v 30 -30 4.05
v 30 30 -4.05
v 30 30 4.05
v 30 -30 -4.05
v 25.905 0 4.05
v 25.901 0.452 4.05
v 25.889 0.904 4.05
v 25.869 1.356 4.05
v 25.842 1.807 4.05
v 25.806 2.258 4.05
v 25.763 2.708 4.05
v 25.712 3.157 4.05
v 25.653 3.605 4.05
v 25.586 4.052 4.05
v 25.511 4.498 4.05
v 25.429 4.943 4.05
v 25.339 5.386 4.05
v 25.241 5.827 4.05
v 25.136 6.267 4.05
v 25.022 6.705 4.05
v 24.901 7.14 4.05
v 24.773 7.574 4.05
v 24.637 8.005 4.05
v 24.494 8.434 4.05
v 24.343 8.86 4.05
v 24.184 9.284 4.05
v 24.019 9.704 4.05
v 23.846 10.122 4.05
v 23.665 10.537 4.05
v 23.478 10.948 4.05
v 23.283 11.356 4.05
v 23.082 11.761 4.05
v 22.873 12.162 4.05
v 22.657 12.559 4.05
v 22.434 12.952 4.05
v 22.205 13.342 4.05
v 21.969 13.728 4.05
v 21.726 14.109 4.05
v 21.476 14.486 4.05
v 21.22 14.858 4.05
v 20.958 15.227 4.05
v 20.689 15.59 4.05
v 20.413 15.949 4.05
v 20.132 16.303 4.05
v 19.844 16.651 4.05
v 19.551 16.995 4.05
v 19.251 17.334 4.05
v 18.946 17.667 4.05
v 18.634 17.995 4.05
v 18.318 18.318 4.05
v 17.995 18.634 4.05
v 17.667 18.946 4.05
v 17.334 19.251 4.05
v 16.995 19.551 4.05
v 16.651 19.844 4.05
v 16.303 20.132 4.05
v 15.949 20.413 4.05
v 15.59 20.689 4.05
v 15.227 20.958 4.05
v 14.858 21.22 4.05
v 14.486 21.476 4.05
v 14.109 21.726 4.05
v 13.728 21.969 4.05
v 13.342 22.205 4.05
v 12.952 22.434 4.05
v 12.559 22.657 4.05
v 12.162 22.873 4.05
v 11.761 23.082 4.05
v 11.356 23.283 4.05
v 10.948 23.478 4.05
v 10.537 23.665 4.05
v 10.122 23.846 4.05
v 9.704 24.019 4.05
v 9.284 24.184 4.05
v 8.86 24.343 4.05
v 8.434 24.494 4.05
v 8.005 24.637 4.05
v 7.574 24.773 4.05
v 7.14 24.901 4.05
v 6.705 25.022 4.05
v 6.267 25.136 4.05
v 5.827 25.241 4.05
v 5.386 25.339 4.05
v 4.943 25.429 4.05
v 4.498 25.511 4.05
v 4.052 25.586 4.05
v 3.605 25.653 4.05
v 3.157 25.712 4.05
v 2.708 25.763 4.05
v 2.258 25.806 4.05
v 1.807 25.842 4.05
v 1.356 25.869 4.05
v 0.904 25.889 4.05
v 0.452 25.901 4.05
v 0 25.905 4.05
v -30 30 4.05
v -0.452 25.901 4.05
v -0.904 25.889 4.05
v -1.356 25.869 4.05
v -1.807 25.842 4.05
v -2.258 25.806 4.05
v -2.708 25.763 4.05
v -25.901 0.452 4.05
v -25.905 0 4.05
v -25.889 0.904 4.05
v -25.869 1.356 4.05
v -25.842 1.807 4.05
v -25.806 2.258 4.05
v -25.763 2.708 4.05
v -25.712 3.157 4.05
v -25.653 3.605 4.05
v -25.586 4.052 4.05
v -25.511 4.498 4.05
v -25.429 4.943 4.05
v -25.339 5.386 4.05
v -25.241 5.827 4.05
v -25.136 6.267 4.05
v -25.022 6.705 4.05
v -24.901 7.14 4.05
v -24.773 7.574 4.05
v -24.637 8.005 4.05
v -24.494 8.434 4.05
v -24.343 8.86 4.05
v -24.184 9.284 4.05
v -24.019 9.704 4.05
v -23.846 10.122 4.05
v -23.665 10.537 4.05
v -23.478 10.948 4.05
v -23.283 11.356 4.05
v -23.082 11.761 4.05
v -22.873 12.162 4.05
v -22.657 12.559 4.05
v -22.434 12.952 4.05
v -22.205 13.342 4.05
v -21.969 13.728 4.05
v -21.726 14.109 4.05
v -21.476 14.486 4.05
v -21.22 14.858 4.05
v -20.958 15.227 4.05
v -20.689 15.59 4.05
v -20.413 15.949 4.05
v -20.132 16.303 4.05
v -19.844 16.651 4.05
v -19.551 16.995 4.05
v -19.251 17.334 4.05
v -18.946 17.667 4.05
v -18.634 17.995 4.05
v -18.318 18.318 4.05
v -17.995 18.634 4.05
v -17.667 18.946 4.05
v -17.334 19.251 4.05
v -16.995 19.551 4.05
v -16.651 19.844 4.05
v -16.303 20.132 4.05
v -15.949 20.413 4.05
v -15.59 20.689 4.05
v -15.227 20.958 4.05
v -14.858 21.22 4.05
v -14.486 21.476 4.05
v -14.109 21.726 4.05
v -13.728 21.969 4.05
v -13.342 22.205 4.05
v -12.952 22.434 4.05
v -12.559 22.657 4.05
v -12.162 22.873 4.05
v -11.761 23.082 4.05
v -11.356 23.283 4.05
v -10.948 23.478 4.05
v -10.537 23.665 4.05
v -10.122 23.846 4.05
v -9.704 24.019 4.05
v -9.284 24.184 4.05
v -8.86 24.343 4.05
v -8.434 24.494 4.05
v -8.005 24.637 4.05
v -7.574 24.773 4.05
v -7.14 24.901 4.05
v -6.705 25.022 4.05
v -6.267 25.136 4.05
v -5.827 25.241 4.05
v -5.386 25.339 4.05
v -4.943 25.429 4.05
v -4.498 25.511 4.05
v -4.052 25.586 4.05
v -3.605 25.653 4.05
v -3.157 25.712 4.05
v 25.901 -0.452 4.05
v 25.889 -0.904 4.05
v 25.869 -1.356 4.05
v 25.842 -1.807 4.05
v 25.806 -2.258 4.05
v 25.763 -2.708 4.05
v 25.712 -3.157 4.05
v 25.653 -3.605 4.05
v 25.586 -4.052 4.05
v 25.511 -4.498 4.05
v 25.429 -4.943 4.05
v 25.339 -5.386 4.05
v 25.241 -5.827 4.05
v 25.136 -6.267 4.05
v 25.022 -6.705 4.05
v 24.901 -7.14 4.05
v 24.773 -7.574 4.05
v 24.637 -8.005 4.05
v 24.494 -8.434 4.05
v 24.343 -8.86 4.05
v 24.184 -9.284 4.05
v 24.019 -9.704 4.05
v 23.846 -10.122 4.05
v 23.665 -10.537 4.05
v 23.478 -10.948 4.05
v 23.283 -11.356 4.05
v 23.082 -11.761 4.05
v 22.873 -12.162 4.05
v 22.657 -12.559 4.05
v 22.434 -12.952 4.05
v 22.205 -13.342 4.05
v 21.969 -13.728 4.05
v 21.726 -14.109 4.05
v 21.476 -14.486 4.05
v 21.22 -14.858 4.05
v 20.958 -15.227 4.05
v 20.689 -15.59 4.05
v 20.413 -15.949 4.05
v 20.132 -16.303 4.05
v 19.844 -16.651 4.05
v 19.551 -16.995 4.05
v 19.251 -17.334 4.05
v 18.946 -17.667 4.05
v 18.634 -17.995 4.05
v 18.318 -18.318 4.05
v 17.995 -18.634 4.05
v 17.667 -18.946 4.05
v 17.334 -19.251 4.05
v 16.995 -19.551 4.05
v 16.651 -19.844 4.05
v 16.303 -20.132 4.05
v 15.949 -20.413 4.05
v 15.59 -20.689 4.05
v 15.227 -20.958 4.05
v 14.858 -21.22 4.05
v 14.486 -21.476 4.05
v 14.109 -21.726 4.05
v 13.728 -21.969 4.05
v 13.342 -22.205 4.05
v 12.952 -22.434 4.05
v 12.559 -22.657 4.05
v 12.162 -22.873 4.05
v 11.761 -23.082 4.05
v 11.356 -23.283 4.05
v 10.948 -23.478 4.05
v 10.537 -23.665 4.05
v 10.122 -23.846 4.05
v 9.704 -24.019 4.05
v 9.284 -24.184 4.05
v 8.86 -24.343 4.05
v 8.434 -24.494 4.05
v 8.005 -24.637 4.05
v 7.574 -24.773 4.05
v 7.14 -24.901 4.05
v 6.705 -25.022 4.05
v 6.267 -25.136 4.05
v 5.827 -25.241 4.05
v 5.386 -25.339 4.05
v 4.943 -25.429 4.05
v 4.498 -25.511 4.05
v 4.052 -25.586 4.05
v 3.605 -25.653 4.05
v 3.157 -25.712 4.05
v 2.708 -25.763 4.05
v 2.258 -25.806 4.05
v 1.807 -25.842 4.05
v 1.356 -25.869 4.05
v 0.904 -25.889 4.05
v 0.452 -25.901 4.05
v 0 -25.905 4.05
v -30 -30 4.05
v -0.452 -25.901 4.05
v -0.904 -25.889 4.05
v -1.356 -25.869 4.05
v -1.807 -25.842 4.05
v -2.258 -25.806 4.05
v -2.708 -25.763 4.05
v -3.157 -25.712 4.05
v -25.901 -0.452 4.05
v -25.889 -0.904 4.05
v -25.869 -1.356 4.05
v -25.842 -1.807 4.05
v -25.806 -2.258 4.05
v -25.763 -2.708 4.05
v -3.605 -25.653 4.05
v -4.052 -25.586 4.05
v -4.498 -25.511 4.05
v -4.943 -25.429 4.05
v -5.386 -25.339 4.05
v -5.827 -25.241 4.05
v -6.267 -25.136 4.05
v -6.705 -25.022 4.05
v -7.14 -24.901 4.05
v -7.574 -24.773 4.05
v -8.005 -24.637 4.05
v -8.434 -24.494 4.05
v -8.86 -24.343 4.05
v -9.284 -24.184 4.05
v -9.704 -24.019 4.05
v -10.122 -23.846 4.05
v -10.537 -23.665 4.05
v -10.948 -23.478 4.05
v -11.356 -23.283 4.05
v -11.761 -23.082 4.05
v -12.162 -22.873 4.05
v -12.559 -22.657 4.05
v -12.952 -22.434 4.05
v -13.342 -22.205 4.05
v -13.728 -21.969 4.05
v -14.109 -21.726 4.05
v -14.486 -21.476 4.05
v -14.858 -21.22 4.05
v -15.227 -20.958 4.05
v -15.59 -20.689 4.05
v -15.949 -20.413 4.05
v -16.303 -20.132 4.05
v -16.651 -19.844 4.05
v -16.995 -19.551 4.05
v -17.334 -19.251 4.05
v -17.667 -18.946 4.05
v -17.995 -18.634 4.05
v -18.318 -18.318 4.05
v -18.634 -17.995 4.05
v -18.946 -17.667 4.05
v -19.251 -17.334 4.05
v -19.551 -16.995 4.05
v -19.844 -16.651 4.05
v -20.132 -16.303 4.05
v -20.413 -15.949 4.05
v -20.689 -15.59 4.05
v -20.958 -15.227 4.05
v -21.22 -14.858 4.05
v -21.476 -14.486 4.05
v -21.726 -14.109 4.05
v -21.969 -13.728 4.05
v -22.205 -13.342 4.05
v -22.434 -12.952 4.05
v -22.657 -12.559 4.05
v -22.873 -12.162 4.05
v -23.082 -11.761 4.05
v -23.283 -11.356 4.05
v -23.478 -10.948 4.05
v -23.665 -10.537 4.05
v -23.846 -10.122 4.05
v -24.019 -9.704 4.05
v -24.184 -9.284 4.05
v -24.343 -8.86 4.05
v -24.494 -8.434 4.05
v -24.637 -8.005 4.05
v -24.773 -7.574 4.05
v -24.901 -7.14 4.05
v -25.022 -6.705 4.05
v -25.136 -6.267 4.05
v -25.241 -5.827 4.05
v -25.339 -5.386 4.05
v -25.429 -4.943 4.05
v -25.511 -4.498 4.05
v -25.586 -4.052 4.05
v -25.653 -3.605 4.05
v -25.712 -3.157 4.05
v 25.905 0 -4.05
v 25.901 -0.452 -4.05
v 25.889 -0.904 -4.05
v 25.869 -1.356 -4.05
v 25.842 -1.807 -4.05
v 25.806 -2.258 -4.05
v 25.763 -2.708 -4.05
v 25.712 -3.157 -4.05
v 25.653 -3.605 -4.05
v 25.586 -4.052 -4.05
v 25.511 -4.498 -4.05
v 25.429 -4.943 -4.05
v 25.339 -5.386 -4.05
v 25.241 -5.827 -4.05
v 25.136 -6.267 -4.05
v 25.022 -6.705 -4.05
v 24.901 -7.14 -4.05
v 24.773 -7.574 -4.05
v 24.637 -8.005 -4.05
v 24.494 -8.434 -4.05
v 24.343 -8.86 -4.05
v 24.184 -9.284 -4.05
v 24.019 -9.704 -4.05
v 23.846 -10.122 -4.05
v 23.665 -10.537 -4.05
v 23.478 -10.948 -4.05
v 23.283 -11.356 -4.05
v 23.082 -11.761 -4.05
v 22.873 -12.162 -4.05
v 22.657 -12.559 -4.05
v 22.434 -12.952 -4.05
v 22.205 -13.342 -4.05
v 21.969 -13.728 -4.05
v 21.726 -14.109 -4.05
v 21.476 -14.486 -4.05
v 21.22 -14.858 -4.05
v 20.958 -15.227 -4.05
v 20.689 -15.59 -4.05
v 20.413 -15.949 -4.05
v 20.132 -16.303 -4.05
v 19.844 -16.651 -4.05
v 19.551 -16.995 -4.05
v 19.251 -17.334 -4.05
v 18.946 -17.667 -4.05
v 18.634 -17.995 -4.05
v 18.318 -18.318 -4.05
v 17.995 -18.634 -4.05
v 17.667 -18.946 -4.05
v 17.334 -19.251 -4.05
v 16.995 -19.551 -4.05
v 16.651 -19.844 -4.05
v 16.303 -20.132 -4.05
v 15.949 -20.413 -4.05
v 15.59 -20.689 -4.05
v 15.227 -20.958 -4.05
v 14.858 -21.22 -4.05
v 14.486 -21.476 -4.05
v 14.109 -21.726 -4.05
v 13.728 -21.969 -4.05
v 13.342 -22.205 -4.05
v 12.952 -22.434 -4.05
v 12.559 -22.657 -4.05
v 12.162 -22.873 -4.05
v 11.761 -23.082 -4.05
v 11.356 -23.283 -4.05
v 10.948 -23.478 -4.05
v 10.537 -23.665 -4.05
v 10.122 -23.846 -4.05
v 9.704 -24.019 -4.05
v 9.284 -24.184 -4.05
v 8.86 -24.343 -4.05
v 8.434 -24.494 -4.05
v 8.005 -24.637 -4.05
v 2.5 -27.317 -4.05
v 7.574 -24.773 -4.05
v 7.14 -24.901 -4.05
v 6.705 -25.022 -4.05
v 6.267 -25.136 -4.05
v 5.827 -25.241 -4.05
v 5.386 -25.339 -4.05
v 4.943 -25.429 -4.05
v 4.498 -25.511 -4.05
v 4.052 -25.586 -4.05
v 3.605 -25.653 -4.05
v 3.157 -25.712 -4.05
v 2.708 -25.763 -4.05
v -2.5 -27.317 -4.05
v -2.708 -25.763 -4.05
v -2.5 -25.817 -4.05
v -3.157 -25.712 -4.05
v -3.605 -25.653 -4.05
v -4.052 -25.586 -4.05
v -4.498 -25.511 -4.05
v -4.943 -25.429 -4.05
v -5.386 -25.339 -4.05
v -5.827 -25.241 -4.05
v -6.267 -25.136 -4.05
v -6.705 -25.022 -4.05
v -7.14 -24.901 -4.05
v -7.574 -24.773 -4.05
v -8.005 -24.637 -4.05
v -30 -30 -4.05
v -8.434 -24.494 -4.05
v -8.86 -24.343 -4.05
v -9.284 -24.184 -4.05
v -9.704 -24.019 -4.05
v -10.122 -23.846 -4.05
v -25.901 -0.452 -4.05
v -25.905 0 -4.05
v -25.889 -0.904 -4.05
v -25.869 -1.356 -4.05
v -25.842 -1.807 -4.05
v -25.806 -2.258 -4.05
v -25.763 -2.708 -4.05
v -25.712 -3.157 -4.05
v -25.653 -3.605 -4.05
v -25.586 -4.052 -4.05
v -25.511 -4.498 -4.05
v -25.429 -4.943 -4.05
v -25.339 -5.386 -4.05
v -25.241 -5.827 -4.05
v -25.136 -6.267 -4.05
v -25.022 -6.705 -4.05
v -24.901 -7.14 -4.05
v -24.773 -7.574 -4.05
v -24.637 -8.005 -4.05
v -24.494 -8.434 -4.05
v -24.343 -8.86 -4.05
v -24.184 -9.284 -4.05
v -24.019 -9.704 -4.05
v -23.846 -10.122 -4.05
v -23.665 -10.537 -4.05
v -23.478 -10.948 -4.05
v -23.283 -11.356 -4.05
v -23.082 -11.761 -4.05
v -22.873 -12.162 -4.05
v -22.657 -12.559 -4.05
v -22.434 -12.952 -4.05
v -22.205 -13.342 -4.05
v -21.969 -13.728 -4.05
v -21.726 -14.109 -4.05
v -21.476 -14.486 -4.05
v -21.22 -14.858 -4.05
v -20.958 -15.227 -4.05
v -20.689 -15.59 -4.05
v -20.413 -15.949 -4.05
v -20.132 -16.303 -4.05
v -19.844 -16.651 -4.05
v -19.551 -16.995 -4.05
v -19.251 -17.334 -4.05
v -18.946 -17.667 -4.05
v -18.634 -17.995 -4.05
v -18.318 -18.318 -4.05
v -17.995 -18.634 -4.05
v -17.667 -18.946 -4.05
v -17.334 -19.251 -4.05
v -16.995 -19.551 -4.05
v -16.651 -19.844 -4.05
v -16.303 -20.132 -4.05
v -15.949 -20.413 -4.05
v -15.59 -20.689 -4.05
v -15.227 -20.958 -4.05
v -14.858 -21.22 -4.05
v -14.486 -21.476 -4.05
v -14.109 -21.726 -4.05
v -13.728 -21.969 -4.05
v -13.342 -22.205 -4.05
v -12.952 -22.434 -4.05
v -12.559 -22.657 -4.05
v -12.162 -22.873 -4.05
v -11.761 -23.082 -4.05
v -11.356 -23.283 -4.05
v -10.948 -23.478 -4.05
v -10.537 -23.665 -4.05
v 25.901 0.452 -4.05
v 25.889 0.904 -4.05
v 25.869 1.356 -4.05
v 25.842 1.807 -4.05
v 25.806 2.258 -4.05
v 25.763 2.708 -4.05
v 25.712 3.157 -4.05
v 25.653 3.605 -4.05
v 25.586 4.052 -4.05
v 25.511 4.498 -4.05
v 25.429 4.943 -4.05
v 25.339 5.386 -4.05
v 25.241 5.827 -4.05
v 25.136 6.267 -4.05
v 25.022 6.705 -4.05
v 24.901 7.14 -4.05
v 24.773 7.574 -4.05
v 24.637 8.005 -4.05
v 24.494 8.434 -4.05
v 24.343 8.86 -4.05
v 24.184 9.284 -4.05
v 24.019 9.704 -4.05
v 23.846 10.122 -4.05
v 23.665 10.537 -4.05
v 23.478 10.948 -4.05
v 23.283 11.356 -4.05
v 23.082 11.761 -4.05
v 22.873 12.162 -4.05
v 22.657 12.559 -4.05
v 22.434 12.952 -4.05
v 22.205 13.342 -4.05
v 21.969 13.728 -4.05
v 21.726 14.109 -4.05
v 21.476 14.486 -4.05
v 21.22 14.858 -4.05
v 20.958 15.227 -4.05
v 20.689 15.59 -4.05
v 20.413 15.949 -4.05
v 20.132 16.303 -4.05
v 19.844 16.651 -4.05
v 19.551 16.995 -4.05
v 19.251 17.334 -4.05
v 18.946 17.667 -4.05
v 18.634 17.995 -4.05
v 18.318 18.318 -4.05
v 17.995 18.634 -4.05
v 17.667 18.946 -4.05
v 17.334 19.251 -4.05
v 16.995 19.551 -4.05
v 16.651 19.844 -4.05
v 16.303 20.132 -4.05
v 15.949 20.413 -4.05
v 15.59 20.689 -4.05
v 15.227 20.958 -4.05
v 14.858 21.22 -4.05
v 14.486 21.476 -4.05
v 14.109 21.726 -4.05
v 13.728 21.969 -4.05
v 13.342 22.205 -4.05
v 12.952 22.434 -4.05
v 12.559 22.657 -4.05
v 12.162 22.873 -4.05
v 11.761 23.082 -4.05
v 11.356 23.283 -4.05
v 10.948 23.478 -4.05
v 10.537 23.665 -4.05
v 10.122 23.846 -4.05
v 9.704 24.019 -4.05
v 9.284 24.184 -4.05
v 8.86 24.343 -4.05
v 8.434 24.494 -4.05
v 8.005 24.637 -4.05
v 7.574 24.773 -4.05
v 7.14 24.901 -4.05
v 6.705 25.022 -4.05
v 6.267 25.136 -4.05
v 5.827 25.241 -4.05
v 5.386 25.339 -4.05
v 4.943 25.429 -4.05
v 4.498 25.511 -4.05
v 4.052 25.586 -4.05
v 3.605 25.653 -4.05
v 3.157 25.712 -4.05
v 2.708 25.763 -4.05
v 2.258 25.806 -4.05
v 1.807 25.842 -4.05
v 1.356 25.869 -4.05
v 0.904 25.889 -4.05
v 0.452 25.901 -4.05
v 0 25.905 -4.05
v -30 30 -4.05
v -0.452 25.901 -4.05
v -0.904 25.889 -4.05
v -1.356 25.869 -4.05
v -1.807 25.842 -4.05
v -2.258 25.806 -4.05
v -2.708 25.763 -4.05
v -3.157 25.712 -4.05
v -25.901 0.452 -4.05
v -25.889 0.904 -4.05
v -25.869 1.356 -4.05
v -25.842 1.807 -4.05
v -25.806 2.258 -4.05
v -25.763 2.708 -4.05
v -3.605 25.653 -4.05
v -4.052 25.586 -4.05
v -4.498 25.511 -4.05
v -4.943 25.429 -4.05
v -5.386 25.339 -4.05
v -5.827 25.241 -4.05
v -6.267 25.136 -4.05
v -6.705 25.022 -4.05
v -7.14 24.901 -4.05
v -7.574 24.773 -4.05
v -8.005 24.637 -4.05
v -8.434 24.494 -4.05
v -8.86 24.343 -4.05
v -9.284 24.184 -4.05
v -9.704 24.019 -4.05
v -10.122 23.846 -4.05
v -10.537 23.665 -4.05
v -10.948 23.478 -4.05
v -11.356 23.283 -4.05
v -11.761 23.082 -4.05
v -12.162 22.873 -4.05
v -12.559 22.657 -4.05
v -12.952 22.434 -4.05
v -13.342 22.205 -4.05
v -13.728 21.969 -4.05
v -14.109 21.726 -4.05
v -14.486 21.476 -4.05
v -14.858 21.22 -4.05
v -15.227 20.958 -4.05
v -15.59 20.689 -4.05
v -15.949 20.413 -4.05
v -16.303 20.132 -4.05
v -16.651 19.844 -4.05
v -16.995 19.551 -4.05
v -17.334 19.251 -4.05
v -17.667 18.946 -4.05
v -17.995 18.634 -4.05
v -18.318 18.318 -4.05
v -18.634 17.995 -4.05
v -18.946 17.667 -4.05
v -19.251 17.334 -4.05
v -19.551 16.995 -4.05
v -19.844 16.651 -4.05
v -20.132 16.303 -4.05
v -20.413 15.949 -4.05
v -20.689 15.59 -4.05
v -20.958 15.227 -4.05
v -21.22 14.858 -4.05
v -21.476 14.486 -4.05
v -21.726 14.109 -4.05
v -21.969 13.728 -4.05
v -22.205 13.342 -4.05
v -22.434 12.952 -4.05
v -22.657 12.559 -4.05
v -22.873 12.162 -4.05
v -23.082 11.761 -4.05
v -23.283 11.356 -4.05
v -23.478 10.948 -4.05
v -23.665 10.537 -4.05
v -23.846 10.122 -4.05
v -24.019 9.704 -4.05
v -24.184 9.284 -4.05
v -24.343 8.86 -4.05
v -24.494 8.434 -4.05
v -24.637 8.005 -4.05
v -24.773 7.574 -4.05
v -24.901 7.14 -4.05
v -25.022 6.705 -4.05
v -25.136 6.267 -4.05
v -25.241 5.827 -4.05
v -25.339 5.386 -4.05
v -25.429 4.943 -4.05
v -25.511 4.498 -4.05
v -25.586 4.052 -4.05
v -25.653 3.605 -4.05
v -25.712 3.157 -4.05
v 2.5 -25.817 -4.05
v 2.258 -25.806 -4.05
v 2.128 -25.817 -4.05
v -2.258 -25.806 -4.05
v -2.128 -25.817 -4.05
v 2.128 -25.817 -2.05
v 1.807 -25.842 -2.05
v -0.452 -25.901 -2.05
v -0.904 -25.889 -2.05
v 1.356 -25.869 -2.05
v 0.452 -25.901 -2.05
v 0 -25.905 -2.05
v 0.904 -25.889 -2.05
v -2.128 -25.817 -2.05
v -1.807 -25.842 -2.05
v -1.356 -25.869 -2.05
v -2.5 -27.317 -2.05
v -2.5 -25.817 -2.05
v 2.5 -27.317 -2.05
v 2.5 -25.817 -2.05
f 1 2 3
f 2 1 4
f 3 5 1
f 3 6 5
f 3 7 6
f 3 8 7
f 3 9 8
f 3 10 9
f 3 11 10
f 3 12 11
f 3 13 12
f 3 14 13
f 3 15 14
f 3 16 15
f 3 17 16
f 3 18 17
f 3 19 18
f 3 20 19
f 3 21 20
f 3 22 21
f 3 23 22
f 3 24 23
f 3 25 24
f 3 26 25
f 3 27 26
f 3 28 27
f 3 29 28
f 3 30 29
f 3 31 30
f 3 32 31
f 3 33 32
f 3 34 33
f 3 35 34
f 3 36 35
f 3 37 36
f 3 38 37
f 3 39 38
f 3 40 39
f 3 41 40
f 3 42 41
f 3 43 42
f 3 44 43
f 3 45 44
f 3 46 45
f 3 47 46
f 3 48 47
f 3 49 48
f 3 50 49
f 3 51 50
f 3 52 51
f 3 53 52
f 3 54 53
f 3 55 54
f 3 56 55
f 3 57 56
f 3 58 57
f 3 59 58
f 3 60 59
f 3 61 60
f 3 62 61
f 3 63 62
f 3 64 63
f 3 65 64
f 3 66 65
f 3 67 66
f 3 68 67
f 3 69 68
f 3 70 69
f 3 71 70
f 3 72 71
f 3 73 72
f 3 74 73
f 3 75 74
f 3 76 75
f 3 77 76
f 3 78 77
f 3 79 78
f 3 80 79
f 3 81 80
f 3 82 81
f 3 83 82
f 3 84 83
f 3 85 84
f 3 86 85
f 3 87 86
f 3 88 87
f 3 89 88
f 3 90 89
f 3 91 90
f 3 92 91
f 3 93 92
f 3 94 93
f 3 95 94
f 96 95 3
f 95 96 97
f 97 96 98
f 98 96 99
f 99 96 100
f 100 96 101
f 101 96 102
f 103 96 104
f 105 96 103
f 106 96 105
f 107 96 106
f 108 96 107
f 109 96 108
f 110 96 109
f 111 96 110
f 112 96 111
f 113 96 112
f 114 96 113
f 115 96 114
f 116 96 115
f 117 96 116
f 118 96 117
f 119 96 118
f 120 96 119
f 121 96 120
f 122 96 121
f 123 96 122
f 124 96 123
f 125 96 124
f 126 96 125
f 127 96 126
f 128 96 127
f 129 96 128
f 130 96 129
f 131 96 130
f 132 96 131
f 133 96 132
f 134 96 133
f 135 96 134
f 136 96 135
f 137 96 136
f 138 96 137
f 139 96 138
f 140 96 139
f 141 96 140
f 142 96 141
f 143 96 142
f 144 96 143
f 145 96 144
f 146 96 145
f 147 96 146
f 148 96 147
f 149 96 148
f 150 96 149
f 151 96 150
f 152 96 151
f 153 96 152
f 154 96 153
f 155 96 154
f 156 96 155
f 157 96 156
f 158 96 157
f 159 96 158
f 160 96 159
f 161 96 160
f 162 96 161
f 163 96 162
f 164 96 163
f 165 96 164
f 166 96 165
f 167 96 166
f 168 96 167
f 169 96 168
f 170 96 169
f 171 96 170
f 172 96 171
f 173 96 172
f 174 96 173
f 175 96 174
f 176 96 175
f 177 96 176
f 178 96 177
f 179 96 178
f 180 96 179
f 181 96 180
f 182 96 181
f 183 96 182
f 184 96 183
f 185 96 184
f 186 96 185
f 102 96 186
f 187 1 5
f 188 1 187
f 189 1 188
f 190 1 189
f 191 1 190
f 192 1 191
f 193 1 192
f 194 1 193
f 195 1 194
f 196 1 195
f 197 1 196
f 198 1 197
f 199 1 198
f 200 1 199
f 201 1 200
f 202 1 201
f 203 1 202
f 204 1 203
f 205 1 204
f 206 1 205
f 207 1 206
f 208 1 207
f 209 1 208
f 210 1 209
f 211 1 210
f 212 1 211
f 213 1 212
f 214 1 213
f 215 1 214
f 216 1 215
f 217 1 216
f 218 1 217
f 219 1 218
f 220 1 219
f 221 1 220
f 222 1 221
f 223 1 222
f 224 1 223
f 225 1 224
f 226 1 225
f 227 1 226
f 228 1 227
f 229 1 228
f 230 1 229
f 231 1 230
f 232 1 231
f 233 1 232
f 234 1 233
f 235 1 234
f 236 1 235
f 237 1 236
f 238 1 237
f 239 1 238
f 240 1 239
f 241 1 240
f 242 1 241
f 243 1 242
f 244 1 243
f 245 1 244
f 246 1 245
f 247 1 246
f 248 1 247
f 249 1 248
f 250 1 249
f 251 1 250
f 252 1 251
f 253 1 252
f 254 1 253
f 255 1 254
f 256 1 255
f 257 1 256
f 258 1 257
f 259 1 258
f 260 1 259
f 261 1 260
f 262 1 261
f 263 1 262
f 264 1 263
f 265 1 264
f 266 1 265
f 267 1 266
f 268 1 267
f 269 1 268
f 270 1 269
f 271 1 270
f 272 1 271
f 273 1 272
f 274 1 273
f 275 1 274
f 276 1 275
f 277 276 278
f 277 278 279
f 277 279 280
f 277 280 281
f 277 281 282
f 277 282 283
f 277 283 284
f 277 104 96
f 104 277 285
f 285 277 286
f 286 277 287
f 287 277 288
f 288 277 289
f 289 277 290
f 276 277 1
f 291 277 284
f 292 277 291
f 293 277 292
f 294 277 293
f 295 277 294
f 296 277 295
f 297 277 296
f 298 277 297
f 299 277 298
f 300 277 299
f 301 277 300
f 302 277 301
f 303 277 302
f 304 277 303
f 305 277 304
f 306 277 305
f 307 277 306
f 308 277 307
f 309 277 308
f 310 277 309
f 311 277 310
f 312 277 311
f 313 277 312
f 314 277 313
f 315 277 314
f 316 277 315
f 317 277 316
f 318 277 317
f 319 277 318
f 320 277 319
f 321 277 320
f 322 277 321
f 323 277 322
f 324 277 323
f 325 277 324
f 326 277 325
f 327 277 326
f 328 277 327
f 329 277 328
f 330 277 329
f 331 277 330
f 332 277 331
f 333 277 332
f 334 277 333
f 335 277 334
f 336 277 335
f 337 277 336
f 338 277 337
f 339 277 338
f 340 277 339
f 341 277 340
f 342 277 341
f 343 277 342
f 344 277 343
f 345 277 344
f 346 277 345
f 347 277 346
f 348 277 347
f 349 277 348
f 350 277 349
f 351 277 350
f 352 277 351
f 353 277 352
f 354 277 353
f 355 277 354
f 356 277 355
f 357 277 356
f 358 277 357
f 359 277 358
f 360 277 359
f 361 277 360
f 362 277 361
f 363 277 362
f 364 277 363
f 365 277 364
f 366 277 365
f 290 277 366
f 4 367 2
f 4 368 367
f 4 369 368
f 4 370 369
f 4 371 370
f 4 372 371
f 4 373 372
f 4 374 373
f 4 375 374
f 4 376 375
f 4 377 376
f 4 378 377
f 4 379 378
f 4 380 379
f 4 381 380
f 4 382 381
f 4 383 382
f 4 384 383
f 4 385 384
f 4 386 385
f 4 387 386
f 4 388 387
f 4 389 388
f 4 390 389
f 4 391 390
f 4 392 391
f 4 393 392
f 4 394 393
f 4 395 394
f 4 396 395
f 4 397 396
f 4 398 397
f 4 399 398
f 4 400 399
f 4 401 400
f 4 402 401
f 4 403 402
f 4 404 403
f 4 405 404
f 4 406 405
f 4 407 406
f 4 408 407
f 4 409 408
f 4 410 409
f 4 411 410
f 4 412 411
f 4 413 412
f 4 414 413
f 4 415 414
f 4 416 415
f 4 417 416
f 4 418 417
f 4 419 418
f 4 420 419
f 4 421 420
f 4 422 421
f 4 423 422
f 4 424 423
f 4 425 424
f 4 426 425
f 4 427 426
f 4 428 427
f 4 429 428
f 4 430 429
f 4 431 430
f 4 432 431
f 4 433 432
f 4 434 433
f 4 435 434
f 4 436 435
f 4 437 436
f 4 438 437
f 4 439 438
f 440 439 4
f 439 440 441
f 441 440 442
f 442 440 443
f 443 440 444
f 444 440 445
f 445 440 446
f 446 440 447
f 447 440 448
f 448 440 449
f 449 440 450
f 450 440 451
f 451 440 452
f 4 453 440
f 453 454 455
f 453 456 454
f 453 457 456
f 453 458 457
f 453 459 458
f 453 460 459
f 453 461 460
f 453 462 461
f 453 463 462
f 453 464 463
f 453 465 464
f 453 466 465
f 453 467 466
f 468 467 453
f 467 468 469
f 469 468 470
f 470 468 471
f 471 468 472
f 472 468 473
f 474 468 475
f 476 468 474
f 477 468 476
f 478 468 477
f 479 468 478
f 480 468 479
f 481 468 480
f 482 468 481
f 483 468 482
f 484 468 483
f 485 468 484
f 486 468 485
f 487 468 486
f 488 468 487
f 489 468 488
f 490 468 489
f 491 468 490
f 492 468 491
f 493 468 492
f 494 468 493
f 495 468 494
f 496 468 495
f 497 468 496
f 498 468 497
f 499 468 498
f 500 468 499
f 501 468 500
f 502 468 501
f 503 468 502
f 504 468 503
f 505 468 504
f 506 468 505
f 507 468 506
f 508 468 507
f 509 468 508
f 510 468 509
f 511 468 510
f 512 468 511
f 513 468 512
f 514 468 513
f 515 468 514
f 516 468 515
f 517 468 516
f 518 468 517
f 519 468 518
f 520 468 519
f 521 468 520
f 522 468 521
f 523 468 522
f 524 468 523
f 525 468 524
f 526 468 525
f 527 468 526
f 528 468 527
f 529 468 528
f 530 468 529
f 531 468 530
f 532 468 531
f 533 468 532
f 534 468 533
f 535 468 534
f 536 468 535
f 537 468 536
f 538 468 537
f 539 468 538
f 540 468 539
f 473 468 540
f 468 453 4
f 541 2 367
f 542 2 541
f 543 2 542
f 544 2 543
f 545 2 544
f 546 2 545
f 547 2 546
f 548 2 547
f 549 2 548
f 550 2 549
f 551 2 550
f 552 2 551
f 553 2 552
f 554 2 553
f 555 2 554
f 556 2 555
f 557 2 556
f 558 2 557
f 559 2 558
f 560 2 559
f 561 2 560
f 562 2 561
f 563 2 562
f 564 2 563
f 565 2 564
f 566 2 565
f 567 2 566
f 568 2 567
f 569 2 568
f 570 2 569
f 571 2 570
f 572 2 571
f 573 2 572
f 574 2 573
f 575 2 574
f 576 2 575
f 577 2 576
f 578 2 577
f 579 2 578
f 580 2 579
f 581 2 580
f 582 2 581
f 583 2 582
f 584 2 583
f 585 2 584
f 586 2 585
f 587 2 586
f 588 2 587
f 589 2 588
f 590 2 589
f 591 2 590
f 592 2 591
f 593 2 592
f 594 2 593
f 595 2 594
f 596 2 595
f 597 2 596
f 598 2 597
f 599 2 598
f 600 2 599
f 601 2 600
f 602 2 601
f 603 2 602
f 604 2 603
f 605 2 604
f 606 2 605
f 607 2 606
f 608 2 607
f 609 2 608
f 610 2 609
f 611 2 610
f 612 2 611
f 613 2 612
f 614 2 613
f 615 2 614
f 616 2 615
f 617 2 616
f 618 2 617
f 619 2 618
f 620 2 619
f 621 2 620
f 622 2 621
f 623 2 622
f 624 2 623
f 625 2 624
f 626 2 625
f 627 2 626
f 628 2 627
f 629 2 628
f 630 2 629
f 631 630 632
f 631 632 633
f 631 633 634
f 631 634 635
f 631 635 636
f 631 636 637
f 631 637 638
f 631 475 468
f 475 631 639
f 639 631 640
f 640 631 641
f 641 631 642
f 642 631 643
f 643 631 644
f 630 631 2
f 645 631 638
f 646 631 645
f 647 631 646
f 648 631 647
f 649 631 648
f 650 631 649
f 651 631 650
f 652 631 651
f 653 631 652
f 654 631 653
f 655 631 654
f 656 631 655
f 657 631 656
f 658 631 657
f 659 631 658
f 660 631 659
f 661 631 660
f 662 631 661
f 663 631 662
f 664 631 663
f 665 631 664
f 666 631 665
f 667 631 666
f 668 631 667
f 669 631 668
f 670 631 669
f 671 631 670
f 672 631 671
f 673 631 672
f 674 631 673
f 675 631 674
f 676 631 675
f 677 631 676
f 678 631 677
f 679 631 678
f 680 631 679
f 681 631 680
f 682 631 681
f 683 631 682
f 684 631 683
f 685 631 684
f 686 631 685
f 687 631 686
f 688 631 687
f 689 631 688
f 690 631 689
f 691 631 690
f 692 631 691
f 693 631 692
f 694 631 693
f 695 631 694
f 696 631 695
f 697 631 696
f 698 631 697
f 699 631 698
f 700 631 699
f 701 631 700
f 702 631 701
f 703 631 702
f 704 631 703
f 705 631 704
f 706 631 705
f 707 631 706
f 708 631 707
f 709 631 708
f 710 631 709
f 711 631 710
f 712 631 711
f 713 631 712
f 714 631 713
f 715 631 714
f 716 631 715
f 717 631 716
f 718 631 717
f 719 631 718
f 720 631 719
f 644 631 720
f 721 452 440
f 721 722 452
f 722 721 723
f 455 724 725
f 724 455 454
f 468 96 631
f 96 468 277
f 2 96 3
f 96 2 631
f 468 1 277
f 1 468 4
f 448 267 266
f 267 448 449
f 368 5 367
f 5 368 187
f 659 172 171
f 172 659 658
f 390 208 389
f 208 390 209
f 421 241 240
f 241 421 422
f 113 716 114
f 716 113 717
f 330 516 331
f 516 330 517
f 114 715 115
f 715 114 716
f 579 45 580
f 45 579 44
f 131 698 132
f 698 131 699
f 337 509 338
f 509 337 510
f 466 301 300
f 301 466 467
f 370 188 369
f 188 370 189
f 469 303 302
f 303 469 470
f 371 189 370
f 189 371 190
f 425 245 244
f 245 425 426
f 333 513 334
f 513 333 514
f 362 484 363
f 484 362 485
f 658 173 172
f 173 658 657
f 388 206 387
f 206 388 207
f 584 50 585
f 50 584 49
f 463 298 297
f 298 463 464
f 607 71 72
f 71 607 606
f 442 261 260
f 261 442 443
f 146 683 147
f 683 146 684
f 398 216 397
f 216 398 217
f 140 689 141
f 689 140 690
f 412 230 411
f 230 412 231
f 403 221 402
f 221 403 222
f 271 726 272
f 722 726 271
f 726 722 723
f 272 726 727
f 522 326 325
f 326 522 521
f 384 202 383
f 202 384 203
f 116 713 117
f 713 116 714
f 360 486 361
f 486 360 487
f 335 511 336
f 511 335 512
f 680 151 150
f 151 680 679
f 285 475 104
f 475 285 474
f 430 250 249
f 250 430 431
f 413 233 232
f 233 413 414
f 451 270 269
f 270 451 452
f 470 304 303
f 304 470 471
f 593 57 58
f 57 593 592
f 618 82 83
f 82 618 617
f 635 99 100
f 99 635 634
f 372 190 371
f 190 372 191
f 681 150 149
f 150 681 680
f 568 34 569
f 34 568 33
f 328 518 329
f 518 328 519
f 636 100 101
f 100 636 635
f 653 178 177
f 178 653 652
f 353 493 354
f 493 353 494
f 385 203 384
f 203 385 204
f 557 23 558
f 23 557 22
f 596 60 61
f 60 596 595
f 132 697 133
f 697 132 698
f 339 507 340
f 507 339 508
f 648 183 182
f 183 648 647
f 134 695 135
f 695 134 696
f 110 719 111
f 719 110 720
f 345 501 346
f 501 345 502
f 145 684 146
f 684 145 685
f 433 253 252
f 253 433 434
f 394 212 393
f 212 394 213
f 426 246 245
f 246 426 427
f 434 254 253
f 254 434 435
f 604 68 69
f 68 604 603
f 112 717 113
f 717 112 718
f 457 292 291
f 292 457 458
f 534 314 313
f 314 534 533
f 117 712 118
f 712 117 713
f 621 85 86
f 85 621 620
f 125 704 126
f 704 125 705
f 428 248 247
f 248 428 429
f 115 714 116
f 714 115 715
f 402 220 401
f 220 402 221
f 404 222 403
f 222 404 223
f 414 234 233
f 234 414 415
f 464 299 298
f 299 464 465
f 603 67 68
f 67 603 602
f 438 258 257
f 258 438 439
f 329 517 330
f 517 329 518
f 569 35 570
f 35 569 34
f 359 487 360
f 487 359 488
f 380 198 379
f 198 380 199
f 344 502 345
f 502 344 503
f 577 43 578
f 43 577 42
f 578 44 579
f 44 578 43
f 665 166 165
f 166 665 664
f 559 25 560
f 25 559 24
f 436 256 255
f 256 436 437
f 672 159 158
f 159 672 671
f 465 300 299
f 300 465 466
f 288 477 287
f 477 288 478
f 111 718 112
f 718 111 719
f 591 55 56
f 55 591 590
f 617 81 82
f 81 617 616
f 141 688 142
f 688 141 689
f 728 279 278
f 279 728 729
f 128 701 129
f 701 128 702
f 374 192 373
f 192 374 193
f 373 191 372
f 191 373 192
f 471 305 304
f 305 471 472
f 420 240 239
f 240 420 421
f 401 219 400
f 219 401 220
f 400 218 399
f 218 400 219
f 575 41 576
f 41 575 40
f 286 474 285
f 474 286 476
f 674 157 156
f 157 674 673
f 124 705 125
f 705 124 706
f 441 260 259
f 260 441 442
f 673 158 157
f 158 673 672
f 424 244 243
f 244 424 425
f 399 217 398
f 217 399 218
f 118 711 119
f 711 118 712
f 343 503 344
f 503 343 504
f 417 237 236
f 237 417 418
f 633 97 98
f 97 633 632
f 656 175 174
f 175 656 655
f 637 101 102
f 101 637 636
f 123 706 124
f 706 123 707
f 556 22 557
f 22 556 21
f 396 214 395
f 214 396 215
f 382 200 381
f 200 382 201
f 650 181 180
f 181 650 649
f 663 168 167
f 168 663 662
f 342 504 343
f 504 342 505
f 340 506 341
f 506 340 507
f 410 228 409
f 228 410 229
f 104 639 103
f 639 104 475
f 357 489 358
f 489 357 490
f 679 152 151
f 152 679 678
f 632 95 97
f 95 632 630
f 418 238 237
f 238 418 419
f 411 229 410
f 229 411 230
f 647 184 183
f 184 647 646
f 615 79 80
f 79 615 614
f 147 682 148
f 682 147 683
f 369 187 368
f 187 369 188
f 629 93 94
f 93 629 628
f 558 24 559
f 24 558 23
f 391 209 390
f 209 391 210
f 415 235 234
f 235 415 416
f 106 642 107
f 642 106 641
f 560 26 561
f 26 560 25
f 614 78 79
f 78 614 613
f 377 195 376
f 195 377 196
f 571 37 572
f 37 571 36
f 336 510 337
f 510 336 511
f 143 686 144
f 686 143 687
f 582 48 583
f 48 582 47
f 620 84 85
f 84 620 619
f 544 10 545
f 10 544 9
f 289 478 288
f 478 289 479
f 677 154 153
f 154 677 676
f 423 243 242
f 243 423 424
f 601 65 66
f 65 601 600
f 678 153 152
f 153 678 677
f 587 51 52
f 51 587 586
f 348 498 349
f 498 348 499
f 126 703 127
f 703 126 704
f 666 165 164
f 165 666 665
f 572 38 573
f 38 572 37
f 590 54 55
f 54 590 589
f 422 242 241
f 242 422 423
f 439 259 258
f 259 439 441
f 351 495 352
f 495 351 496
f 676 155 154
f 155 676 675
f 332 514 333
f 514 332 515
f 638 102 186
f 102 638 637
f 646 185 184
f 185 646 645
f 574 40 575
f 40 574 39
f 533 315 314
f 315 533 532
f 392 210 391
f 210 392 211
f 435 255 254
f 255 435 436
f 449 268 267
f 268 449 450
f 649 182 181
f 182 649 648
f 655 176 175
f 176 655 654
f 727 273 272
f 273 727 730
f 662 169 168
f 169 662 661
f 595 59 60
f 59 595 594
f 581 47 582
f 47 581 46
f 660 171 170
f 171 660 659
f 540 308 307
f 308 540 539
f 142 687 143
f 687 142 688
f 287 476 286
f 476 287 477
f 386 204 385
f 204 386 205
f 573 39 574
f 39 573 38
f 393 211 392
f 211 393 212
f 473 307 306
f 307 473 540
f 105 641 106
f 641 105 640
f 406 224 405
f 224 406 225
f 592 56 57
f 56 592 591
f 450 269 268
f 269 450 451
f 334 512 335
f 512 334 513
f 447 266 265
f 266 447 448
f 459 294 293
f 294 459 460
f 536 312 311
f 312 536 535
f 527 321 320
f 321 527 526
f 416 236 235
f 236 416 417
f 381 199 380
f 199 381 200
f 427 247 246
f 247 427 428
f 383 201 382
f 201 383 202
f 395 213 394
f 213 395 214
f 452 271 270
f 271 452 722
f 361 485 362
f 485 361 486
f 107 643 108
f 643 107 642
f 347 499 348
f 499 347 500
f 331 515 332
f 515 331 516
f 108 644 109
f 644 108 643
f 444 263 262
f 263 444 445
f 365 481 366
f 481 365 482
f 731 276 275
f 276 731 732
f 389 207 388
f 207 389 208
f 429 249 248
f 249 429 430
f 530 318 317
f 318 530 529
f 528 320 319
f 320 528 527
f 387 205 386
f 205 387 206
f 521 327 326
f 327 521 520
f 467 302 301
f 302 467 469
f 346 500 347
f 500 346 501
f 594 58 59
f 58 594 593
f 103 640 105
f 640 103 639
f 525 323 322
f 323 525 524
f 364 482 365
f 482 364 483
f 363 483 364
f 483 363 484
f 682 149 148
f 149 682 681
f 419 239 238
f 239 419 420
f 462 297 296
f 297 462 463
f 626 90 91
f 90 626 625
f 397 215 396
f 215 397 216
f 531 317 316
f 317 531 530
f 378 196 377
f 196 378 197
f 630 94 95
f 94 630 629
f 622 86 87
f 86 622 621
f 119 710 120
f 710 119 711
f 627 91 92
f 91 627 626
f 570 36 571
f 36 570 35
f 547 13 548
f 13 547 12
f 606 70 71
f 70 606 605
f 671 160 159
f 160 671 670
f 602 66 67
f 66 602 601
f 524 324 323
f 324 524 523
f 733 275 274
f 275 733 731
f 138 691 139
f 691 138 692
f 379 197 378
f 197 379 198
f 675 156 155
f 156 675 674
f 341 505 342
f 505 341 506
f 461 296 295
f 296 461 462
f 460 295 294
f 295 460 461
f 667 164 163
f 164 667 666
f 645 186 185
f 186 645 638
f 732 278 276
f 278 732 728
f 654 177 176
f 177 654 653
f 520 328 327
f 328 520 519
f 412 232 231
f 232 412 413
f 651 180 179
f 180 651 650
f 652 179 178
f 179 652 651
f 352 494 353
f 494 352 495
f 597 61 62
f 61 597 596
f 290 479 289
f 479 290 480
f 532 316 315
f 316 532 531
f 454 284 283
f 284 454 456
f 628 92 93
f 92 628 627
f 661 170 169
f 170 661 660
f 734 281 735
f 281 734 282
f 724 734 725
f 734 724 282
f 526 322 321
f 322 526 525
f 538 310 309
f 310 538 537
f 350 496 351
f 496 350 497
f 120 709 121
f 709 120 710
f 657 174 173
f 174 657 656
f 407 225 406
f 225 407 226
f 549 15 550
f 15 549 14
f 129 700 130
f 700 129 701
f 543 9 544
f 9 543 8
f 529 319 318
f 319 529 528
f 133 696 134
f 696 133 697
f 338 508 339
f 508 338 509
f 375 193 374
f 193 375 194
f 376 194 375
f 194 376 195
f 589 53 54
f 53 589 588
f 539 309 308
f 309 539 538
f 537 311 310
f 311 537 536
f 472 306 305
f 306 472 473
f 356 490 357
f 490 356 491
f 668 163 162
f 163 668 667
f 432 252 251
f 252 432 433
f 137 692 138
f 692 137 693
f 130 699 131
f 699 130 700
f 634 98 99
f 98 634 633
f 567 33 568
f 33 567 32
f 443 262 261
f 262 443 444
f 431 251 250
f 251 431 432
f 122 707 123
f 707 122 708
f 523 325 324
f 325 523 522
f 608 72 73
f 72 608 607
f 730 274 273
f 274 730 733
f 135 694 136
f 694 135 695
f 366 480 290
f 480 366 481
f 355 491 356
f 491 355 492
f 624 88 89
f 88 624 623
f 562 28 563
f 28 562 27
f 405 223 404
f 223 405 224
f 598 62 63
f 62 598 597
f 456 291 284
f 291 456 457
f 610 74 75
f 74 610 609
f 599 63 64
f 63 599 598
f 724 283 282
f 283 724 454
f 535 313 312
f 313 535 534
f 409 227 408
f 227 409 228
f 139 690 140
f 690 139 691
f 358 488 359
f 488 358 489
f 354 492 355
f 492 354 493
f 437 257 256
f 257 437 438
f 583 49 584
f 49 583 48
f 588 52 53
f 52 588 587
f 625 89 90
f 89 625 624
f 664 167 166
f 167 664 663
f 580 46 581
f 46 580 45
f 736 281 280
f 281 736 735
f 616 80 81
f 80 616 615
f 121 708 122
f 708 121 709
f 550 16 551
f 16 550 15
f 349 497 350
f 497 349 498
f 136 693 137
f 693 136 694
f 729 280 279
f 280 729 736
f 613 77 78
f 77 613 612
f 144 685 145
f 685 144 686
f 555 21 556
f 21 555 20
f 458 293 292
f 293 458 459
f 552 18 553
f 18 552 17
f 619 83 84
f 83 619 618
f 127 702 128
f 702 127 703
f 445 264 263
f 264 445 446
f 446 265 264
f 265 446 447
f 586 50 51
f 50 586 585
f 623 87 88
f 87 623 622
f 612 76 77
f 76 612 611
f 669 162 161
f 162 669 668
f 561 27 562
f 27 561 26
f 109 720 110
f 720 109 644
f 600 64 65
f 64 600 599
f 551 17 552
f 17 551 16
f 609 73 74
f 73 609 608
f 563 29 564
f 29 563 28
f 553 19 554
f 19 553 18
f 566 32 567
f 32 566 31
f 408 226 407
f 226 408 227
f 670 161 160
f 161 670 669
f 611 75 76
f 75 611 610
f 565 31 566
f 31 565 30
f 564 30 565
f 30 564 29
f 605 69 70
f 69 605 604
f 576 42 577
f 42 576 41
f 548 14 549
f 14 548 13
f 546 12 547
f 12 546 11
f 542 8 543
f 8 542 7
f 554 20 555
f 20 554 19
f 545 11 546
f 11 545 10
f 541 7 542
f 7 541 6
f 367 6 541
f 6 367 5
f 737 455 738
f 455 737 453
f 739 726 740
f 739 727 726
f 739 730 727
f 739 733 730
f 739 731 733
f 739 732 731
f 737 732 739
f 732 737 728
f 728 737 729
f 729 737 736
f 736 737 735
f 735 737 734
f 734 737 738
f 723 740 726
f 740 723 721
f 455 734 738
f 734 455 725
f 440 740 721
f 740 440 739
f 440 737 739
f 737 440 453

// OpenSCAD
epsilon = 0.001;
tolerance = 0.01;

height = 8.1;
side = 60;
hole = 51.8;

notch_thickness = 2;
notch_length = 5;
notch_width = 1.5;

$fa = 1.0;
$fs = 0.14;

difference()
{
	cube([ side, side, height ], center = true);
	translate([ 0, 0, -height ])
	linear_extrude(height = 3 * height) circle(d = hole + tolerance);
    translate([ 0, -hole/2 - notch_thickness/3, -height/2 - epsilon ])
    linear_extrude(height = notch_thickness + epsilon) square([notch_length, notch_width], center = true);
}

module notchedCircle(x, y, z, notch_width, notch_height, notch_depth, circle_diameter, circle_thickness) {
    epsilonN = 0.001;
    translate([x, y, z])
    	linear_extrude(height = 3 * height) circle(d = hole + tolerance);
    linear_extrude(height = notch_thickness + epsilon) square([notch_length, notch_width]);
}
